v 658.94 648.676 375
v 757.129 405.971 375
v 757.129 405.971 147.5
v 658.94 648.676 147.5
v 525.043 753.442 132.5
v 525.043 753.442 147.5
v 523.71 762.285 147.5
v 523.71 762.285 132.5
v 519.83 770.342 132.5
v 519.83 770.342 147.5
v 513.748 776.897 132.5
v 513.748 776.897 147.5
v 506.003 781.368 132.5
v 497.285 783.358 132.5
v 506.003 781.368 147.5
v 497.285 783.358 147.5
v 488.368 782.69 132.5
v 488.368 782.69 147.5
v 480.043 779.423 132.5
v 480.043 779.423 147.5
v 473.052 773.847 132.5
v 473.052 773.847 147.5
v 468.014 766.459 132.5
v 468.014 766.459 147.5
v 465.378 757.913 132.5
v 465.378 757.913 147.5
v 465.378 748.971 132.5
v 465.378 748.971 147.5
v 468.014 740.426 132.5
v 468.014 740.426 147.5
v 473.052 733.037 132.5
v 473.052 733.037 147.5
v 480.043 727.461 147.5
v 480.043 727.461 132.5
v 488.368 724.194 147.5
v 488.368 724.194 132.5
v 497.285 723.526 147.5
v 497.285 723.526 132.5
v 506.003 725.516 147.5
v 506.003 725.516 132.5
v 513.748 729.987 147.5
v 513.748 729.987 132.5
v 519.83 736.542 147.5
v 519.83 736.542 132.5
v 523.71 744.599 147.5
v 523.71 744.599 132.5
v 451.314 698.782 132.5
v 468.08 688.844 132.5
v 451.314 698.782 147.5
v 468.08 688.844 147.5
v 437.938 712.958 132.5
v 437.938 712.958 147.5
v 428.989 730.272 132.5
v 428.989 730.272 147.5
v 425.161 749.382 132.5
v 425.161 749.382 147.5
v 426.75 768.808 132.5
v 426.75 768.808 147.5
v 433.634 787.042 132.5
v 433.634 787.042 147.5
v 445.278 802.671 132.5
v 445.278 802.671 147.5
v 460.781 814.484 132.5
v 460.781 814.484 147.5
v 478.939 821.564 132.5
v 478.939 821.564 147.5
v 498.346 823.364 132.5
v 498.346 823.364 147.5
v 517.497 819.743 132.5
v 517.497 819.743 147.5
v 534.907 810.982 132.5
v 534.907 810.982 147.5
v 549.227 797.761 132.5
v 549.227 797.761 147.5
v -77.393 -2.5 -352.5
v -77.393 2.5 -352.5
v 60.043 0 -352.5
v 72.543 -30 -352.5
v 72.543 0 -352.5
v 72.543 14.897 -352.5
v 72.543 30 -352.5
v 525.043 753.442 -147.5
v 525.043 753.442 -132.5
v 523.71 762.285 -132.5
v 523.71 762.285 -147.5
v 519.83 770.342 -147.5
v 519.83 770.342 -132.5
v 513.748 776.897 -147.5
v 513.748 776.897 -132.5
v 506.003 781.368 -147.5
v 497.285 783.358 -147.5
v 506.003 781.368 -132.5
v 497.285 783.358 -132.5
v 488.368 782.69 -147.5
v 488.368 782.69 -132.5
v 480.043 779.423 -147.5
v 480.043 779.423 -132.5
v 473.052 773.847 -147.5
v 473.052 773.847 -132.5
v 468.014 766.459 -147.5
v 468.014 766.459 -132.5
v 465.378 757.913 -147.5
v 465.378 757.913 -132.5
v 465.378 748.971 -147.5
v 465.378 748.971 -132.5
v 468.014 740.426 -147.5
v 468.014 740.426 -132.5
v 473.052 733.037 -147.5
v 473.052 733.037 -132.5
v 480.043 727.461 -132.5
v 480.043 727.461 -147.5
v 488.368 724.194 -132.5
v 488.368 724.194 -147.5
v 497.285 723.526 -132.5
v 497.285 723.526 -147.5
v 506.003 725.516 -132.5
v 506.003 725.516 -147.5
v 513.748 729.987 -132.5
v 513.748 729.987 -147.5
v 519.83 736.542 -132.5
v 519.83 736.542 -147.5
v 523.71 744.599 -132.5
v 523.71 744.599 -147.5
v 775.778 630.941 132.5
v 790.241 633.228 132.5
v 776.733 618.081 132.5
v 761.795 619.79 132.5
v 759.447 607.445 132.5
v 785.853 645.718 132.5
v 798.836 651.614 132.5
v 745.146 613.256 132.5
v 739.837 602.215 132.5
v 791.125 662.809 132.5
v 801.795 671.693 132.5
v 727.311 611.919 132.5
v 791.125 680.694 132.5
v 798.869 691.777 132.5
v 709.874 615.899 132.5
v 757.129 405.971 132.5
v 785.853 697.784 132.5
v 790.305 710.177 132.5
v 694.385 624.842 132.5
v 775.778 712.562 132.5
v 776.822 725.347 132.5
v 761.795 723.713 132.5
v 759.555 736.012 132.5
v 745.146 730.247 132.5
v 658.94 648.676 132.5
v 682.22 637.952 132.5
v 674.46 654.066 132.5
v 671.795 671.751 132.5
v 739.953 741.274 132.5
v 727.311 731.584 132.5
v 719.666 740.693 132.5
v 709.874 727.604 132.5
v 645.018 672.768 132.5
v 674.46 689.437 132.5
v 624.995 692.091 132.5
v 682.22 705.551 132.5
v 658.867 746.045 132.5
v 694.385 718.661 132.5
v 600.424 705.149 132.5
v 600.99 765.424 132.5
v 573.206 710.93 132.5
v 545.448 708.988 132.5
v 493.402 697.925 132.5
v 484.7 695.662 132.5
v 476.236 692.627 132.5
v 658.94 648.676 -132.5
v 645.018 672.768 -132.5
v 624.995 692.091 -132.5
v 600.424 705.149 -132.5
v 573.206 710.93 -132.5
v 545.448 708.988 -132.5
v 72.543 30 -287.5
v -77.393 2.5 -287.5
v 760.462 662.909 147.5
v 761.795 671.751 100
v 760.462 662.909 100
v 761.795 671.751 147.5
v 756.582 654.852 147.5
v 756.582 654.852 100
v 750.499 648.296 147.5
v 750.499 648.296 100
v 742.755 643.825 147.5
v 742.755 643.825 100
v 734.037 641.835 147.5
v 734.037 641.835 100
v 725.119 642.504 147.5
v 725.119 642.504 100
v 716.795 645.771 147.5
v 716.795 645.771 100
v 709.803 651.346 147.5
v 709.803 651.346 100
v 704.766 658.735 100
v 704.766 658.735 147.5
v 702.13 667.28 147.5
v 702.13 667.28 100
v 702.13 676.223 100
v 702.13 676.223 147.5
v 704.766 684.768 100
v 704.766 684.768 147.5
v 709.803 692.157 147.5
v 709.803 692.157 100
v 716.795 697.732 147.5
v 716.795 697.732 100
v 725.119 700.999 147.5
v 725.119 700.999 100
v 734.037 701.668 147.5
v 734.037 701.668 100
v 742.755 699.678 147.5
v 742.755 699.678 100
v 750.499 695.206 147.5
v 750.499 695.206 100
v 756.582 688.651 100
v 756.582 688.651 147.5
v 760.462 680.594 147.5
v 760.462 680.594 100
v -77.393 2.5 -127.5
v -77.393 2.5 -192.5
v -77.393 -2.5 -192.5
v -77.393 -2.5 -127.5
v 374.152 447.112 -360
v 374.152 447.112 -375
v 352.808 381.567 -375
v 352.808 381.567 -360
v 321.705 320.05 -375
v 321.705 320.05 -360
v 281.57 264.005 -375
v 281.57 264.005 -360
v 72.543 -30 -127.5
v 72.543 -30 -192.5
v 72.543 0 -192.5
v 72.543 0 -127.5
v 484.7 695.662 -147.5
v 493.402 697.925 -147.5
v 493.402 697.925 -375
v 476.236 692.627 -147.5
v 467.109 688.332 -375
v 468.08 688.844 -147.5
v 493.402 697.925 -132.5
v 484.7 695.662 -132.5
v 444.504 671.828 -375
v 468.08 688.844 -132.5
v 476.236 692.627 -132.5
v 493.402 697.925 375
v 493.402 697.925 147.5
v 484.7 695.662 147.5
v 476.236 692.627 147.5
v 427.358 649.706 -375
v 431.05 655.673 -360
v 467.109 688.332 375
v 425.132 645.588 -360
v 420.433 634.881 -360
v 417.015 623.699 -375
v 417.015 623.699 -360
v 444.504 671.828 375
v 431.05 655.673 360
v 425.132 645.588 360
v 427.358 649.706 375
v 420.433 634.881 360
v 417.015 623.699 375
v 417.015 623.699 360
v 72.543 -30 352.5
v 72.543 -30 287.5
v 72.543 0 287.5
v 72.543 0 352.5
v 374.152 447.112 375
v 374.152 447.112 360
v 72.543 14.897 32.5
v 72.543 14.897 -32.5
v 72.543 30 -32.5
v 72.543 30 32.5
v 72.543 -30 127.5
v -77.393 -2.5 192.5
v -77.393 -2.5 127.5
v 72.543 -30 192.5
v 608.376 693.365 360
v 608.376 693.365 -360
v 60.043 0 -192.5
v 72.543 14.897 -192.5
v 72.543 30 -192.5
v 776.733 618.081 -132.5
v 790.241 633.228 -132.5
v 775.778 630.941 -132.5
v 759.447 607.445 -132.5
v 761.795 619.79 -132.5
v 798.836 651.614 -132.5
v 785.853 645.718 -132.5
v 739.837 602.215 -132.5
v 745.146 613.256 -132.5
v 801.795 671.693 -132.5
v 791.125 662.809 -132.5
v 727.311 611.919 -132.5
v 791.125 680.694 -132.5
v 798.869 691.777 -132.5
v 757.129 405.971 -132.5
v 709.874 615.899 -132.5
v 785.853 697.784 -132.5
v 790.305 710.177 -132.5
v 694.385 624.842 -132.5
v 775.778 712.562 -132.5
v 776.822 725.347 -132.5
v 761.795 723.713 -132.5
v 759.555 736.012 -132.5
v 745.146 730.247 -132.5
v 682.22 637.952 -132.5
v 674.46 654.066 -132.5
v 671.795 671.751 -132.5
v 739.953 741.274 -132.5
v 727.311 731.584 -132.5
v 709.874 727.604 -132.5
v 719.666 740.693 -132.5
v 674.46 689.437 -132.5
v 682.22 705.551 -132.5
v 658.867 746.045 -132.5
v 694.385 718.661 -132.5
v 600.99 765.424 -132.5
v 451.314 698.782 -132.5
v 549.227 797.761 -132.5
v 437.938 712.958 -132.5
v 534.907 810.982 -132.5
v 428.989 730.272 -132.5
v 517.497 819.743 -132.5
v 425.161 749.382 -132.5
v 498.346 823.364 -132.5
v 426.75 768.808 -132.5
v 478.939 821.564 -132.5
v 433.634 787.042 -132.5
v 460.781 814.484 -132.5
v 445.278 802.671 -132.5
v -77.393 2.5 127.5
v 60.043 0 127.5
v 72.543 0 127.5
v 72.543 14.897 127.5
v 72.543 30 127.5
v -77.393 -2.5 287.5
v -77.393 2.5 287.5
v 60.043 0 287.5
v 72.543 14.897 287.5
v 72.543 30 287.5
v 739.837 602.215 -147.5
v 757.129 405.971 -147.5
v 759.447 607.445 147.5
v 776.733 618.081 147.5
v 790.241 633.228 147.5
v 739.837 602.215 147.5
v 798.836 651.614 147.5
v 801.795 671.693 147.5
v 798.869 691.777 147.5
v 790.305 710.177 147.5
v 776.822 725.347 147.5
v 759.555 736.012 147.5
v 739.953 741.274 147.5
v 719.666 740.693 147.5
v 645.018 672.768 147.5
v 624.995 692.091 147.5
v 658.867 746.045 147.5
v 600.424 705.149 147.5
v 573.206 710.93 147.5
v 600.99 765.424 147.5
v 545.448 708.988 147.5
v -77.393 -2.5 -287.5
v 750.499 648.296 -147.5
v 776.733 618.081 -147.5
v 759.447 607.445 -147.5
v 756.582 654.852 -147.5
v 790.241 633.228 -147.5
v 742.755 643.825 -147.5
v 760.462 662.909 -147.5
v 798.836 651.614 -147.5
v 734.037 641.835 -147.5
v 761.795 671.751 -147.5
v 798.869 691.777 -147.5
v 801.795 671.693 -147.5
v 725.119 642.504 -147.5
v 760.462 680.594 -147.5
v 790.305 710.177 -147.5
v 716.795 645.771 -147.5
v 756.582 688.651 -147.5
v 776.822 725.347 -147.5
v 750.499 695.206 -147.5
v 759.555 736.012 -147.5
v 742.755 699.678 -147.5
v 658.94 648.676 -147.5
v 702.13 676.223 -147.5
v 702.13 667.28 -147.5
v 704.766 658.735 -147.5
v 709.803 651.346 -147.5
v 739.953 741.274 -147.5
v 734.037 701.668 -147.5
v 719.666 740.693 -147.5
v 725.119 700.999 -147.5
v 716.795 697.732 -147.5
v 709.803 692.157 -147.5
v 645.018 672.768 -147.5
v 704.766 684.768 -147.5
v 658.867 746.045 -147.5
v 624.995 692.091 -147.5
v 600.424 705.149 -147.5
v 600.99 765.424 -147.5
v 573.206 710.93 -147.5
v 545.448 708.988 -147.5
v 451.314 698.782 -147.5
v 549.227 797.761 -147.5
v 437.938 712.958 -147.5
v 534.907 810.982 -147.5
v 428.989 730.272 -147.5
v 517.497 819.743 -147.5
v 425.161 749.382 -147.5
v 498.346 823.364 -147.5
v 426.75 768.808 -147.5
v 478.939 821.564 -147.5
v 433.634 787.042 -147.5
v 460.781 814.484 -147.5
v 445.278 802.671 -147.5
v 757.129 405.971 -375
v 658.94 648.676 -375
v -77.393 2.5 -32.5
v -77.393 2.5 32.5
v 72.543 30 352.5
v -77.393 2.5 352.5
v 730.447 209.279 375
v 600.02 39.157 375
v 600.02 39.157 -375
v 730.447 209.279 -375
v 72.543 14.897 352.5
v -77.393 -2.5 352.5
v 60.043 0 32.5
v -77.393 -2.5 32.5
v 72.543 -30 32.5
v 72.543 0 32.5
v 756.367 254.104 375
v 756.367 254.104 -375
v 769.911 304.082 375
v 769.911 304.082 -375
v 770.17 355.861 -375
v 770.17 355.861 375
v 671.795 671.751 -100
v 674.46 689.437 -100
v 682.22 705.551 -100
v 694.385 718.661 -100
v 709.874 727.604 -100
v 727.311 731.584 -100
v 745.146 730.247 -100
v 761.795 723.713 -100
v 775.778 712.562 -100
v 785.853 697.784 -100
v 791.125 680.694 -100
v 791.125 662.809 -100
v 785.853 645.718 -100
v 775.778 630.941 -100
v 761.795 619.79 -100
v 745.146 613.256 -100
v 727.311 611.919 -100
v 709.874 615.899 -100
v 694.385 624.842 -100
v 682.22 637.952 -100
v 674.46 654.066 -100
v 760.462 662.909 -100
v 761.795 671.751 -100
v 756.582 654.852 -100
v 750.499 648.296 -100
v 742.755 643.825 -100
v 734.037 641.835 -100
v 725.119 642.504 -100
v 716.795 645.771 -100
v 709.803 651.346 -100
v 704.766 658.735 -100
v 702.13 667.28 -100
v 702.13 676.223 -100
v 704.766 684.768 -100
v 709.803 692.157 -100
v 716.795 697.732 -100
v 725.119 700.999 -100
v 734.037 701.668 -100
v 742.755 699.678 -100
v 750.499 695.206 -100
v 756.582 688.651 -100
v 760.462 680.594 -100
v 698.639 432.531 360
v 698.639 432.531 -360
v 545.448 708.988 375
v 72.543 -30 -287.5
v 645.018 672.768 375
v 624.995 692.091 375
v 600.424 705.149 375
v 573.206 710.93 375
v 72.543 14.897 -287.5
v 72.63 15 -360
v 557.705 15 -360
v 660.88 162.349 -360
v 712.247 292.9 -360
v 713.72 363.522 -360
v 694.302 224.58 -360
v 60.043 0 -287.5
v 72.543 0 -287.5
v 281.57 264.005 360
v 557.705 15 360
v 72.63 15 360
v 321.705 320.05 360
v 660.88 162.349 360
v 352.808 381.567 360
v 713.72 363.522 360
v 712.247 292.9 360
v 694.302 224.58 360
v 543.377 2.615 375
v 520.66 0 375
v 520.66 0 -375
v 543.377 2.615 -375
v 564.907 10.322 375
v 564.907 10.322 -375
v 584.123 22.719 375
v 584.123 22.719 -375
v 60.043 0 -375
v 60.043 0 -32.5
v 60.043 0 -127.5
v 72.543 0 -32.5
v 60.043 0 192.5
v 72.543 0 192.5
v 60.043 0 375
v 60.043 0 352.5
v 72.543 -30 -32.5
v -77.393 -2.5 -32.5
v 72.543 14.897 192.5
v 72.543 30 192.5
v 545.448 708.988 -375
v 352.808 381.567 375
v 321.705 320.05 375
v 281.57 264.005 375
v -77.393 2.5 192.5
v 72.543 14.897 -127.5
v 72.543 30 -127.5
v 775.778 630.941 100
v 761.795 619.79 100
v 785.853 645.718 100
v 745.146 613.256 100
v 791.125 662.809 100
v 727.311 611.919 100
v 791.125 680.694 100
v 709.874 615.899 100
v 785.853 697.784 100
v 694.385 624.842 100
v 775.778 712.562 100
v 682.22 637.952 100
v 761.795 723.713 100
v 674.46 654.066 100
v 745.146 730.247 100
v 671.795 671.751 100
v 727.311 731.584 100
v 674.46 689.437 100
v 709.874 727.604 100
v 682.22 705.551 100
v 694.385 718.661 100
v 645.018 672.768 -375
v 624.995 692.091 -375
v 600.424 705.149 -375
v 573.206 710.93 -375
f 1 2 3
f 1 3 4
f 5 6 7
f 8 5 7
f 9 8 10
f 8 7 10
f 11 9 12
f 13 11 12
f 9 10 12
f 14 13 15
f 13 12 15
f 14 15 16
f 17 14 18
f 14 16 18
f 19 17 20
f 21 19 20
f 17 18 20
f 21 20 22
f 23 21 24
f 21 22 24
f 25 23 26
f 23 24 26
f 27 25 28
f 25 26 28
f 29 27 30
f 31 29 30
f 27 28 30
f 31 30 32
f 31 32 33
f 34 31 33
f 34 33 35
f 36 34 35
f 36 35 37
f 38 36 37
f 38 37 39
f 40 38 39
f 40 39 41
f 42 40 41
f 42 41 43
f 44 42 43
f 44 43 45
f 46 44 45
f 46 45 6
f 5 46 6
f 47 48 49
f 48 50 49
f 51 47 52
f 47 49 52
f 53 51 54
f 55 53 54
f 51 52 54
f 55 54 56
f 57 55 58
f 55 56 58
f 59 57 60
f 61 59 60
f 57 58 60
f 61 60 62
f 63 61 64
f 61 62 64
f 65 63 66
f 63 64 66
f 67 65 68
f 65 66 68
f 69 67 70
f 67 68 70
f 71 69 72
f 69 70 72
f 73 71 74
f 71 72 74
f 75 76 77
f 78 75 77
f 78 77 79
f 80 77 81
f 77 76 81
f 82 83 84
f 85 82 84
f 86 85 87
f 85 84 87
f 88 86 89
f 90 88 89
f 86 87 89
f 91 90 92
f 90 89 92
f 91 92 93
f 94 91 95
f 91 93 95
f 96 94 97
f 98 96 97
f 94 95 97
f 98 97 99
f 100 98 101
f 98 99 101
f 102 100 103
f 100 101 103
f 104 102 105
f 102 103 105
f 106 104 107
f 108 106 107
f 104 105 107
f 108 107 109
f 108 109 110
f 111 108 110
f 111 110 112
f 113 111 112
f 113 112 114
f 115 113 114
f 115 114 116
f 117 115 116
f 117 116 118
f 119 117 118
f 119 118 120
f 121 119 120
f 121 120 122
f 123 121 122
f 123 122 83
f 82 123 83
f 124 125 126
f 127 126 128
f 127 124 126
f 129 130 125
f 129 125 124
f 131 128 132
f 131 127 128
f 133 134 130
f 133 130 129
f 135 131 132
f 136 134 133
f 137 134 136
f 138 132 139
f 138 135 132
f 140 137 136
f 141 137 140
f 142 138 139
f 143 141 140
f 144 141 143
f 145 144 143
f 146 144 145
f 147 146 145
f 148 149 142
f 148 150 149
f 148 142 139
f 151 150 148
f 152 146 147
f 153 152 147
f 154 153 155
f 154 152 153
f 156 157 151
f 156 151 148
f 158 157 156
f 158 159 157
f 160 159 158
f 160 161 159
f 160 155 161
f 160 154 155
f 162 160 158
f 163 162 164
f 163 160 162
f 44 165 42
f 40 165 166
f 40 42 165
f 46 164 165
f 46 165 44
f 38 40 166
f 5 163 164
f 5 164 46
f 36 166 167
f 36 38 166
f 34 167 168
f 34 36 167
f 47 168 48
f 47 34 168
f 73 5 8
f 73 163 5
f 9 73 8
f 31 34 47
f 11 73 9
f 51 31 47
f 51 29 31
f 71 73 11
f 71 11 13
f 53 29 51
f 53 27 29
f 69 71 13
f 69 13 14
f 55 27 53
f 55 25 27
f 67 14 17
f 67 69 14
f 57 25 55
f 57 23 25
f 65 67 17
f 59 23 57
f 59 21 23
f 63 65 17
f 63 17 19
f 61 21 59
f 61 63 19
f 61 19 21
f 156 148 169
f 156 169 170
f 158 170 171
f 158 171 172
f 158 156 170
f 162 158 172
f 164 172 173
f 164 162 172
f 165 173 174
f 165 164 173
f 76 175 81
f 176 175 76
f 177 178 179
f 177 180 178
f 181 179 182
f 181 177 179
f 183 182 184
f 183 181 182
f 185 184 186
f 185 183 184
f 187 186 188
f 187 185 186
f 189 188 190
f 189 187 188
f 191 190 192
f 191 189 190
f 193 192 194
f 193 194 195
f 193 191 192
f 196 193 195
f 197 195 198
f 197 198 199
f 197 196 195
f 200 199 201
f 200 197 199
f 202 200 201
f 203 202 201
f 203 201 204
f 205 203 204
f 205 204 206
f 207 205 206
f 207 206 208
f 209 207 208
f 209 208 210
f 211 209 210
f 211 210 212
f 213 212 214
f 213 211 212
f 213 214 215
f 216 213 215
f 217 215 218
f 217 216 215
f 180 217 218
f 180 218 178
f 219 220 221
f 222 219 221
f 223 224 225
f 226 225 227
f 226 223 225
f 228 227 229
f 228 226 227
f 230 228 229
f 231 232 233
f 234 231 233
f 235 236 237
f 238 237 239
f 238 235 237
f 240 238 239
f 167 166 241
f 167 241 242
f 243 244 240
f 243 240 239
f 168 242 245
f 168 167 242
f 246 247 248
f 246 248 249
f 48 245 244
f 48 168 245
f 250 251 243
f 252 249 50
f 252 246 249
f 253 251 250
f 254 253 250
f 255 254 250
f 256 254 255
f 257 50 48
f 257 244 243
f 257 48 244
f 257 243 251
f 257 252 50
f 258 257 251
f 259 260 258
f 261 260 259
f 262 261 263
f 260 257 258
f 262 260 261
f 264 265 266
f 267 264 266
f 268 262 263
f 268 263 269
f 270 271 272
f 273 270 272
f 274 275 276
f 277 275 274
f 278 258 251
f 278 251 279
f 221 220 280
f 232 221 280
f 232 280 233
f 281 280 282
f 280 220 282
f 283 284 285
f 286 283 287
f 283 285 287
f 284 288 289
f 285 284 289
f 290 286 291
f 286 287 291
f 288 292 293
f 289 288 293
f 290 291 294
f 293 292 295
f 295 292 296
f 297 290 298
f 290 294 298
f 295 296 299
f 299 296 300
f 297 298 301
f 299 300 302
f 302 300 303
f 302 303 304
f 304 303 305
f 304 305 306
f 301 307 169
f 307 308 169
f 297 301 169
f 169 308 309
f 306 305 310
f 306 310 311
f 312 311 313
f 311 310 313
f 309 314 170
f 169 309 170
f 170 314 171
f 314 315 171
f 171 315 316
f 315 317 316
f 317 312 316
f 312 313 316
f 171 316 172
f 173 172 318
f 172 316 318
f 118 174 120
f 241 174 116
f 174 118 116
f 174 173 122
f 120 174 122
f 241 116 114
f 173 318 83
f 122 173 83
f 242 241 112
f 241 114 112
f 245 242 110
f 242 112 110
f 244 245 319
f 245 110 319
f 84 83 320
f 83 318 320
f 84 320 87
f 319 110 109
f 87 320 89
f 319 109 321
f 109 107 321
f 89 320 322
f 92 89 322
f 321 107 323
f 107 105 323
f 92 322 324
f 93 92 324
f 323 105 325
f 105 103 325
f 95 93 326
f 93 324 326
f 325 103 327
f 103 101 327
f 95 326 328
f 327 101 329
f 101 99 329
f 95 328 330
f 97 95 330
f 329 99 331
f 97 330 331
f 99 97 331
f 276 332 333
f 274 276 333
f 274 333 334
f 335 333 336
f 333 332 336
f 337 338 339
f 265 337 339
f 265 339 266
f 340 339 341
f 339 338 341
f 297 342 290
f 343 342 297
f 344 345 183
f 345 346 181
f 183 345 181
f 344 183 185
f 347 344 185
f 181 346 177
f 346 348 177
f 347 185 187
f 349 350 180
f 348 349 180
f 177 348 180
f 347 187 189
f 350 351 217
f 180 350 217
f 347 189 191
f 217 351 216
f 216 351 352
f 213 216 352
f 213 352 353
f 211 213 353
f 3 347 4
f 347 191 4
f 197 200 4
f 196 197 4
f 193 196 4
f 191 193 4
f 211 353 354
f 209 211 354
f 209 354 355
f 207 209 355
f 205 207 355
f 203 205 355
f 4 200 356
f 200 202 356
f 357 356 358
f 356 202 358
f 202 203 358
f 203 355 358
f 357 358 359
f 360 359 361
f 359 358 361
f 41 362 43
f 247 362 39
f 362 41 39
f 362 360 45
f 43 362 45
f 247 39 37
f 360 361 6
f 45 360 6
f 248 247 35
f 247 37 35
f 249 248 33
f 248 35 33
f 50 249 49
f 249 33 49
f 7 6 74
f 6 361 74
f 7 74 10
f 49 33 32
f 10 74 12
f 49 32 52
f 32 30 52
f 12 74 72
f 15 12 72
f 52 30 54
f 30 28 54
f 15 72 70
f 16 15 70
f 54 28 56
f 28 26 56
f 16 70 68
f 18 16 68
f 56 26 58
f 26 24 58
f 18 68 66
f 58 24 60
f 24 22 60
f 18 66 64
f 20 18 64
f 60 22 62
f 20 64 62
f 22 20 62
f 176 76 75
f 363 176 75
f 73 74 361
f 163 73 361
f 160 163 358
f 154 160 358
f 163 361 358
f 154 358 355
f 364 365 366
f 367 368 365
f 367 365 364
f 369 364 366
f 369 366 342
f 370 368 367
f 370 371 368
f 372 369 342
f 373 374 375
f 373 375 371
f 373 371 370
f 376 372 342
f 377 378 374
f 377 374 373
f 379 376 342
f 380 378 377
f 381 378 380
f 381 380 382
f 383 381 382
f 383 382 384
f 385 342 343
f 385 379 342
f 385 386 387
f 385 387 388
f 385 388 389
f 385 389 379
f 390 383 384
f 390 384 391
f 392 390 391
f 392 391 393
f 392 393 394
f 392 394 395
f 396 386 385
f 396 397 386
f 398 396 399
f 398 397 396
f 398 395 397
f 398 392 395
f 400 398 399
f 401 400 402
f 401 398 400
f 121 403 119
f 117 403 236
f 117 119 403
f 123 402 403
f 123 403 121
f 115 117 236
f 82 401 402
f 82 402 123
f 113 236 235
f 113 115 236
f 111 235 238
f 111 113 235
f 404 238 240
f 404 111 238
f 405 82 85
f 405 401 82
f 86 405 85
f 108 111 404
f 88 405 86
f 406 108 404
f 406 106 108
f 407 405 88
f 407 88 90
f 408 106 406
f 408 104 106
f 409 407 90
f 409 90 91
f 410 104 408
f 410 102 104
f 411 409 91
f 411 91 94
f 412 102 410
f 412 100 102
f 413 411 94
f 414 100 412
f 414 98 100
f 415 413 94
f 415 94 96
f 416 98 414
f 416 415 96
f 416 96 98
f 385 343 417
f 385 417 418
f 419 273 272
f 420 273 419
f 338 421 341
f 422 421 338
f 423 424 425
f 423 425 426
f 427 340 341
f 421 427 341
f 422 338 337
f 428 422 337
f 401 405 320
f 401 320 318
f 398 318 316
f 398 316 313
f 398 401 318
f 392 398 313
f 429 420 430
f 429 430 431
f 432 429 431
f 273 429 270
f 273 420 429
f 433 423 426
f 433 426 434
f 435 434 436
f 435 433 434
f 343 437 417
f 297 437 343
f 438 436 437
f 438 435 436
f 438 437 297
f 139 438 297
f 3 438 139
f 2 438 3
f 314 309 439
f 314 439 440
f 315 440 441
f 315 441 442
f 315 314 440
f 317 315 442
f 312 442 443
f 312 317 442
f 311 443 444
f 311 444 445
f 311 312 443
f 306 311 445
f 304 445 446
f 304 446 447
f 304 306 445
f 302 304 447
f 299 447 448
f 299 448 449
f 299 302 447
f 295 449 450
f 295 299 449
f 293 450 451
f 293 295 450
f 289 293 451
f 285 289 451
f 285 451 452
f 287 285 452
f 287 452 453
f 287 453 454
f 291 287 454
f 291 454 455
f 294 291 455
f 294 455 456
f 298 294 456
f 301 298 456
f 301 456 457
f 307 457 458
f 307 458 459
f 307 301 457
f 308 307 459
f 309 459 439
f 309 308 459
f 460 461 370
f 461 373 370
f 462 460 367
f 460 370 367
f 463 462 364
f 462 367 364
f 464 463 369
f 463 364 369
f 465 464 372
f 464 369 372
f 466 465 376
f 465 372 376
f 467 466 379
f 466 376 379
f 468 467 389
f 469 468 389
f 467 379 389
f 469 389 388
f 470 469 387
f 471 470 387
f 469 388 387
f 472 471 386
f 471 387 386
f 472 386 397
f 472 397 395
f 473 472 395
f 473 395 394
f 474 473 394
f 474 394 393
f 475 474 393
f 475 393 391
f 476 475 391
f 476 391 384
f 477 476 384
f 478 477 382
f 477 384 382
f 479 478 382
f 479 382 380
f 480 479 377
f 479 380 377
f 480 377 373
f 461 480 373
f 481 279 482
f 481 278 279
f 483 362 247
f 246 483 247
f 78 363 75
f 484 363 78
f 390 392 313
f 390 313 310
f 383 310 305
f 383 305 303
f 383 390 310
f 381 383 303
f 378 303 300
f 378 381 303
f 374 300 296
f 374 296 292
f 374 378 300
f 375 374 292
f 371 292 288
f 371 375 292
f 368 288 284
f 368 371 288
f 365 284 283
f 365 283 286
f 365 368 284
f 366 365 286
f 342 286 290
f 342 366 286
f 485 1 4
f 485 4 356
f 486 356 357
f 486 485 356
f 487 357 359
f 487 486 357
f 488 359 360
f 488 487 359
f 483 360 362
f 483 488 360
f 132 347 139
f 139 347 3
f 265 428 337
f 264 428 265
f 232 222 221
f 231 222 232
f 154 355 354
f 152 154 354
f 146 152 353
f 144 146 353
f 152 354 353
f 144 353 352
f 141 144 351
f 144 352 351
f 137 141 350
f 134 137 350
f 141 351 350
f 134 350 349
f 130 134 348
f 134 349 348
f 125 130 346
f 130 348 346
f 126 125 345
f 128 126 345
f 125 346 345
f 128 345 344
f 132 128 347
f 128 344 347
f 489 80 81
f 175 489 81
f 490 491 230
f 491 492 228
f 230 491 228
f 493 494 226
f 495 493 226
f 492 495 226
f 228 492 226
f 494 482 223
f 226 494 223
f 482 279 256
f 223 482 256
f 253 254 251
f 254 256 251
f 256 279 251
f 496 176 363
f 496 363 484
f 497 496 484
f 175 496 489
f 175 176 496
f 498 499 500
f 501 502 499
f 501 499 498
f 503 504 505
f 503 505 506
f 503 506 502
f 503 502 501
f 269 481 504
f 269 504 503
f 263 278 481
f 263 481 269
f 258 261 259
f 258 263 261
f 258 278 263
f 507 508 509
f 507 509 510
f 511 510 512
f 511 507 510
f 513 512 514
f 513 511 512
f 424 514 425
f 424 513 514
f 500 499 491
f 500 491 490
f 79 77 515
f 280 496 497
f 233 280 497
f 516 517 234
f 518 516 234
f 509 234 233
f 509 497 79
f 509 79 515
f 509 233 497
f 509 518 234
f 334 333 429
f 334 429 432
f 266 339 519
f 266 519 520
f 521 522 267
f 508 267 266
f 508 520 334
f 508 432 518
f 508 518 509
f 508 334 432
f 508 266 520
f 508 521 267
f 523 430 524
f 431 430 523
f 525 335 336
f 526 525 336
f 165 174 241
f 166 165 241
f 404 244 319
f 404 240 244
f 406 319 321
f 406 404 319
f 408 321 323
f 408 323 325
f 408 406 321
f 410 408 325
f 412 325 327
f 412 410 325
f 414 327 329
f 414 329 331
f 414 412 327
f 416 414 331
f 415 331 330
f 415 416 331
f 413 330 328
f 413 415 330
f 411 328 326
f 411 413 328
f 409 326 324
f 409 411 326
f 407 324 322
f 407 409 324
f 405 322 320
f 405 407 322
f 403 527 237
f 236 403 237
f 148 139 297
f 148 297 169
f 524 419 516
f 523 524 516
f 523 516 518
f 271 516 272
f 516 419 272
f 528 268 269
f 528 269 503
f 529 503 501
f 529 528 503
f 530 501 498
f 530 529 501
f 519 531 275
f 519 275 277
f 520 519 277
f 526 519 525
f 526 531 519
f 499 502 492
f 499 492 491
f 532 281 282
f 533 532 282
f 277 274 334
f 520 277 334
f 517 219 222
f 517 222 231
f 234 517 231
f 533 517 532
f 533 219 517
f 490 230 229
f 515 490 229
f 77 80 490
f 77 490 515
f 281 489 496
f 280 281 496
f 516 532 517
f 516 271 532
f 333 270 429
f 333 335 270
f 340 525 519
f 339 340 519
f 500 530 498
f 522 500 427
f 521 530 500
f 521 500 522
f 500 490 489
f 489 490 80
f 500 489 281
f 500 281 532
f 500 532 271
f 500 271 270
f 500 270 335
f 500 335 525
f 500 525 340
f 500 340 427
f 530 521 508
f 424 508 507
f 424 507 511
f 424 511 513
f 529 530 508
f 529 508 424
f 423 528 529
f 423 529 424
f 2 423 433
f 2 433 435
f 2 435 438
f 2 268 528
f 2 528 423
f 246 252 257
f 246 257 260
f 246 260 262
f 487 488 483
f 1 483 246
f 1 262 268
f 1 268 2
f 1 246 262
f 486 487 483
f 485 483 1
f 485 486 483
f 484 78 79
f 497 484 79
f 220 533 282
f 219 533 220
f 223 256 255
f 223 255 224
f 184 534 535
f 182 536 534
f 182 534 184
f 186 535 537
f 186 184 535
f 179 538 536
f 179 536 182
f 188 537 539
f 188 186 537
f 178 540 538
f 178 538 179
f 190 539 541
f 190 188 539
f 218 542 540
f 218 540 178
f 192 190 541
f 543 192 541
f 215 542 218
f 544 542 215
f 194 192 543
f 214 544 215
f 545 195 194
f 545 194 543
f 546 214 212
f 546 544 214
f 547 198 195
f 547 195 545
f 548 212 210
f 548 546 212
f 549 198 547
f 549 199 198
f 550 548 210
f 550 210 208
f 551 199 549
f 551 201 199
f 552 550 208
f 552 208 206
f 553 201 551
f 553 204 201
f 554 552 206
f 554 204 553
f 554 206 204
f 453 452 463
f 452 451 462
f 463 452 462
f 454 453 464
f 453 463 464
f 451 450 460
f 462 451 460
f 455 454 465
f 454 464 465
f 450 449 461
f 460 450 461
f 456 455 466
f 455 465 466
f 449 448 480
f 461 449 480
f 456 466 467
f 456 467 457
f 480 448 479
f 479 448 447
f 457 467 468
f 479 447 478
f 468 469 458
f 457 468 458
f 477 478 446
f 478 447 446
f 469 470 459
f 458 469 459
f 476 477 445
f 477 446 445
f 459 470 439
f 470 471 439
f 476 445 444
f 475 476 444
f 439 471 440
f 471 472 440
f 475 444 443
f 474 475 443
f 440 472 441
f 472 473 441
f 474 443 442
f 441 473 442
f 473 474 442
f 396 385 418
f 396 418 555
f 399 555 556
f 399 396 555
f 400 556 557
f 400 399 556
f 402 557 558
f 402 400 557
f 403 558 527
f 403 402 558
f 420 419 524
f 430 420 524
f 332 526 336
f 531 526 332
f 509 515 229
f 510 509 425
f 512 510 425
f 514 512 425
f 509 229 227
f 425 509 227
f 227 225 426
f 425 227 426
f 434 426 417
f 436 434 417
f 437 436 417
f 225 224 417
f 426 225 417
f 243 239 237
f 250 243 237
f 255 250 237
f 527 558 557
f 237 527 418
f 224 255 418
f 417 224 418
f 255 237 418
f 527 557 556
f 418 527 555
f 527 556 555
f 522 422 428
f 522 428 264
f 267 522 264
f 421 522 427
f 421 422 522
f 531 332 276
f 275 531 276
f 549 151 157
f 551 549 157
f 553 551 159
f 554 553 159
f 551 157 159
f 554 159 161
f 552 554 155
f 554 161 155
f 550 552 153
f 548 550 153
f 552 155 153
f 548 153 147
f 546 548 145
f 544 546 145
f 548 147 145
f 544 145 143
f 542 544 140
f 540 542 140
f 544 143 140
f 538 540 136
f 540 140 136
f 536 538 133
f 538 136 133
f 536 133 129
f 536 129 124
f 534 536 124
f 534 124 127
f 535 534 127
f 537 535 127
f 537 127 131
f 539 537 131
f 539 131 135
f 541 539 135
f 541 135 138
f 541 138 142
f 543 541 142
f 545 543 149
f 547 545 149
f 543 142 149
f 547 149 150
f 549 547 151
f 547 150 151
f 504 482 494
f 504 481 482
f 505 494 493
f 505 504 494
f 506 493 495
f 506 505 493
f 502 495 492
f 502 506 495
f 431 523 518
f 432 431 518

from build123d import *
from build123d.topology import SkipClean

# Parameters (mm, degrees)
BOSS_EXTRUDE4_DEPTH  = 375
BOSS_EXTRUDE5_DEPTH  = 7.5
CUT_EXTRUDE1_DEPTH   = 360
BOSS_EXTRUDE6_DEPTH  = 32.5
LPATTERN1_COUNT      = 3
LPATTERN1_PITCH      = 160
LPATTERN1_COUNT_DIR2 = 3
LPATTERN1_PITCH_DIR2 = 160
SKETCH11_R           = 30
CUT_EXTRUDE2_DEPTH   = 1263.512529339
SKETCH12_R           = 60
SKETCH12_R_2         = 30
BOSS_EXTRUDE7_DEPTH  = 32.5


with BuildPart() as part:
    # Sketch1 → Boss-Extrude4 (new, symmetric)
    with BuildSketch(Plane.XY):
        with BuildLine():
            Line((281.569977344, 264.00526259), (60.043258876, 0))
            Line((60.043258876, 0), (520.65961219, 0))
            ThreePointArc((520.65961219, 0), (564.907123778, 10.321921752), (600.02024832, 39.156845634))
            Line((600.02024832, 39.156845634), (730.44724808, 209.279019234))
            ThreePointArc((730.44724808, 209.279019234), (769.910899903, 304.081580706), (757.128519442, 405.97130652))
            Line((757.128519442, 405.97130652), (658.940406775, 648.676304078))
            ThreePointArc((658.940406775, 648.676304078), (613.16613298, 699.478789474), (545.447965883, 708.988074874))
            Line((545.447965883, 708.988074874), (493.401915404, 697.925345336))
            ThreePointArc((493.401915404, 697.925345336), (444.503904969, 671.828213907), (417.014937982, 623.698884104))
            Line((417.014937982, 623.698884104), (374.151637205, 447.112342165))
            ThreePointArc((374.151637205, 447.112342165), (338.436231819, 350.211710608), (281.569977344, 264.00526259))
        make_face()
    extrude(amount=BOSS_EXTRUDE4_DEPTH, both=True)

    # Sketch6 → Boss-Extrude5 (add, symmetric)
    with BuildSketch(Plane.XY.offset(140)):
        with BuildLine():
            Line((739.837232288, 602.21499348), (757.128519442, 405.97130652))
            Line((757.128519442, 405.97130652), (468.079651675, 688.843619215))
            ThreePointArc((468.079651675, 688.843619215), (438.909700759, 795.263431413), (549.226629435, 797.76097261))
            ThreePointArc((549.226629435, 797.76097261), (629.357941615, 754.030269249), (719.665800913, 740.692647386))
            ThreePointArc((719.665800913, 740.692647386), (801.063667795, 681.841548153), (739.837232288, 602.21499348))
        make_face()
    boss_extrude5 = extrude(amount=BOSS_EXTRUDE5_DEPTH, both=True)

    # Mirror2: Boss-Extrude5 across plane
    add(boss_extrude5.mirror(Plane.XY))

    # Sketch7 → Cut-Extrude1 (cut, symmetric)
    with BuildSketch(Plane.XY):
        with BuildLine():
            Line((60.410578327, 15), (329.990480538, 400))
            Line((329.990480538, 400), (404.359842809, 650))
            Line((404.359842809, 650), (608.375948196, 693.364961886))
            Line((608.375948196, 693.364961886), (698.639094975, 432.530508414))
            ThreePointArc((698.639094975, 432.530508414), (712.247197771, 292.899677108), (660.880251772, 162.349355884))
            Line((660.880251772, 162.349355884), (557.705122032, 15))
            Line((557.705122032, 15), (60.410578327, 15))
        make_face()
    extrude(amount=CUT_EXTRUDE1_DEPTH, both=True, mode=Mode.SUBTRACT)

    # Sketch10 → Boss-Extrude6 (add, symmetric)
    with BuildSketch(Plane.XY):
        Polygon((72.542939803, 30), (-77.392739815, 2.5), (-77.392739815, -2.5), (72.542939803, -30), (72.542939803, 0), align=None)
    boss_extrude6 = extrude(amount=BOSS_EXTRUDE6_DEPTH, both=True)

    # LPattern1: Boss-Extrude6 3 × 3
    with Locations(*[Vector(0, 0, 1) * (i * LPATTERN1_PITCH) + Vector(0, 0, -1) * (j * LPATTERN1_PITCH_DIR2) for i in range(LPATTERN1_COUNT) for j in range(LPATTERN1_COUNT_DIR2) if (i, j) != (0, 0)]):
        add(boss_extrude6)

    # Sketch11 → Cut-Extrude2 (cut, through all)
    with BuildSketch(Plane.XY.offset(147.5)):
        with Locations((495.043258876, 753.442101292)):
            Circle(SKETCH11_R)
        with Locations((731.794701004, 671.751442127)):
            Circle(SKETCH11_R)
    extrude(amount=-CUT_EXTRUDE2_DEPTH, mode=Mode.SUBTRACT)

    # Sketch12 → Boss-Extrude7 (add)
    with SkipClean():  # the faces are left unmerged after this step: merging them gives an invalid solid
        with BuildSketch(Plane(origin=(0, 0, 132.5), x_dir=(-1, 0, 0), z_dir=(0, 0, -1))):
            with Locations((-731.794701004, 671.751442127)):
                Circle(SKETCH12_R)
            with Locations((-731.794701004, 671.751442127)):
                Circle(SKETCH12_R_2, mode=Mode.SUBTRACT)
        boss_extrude7 = extrude(amount=BOSS_EXTRUDE7_DEPTH)

    # Mirror3: Boss-Extrude7 across plane
    add(boss_extrude7.mirror(Plane.XY))


solid = part.part
